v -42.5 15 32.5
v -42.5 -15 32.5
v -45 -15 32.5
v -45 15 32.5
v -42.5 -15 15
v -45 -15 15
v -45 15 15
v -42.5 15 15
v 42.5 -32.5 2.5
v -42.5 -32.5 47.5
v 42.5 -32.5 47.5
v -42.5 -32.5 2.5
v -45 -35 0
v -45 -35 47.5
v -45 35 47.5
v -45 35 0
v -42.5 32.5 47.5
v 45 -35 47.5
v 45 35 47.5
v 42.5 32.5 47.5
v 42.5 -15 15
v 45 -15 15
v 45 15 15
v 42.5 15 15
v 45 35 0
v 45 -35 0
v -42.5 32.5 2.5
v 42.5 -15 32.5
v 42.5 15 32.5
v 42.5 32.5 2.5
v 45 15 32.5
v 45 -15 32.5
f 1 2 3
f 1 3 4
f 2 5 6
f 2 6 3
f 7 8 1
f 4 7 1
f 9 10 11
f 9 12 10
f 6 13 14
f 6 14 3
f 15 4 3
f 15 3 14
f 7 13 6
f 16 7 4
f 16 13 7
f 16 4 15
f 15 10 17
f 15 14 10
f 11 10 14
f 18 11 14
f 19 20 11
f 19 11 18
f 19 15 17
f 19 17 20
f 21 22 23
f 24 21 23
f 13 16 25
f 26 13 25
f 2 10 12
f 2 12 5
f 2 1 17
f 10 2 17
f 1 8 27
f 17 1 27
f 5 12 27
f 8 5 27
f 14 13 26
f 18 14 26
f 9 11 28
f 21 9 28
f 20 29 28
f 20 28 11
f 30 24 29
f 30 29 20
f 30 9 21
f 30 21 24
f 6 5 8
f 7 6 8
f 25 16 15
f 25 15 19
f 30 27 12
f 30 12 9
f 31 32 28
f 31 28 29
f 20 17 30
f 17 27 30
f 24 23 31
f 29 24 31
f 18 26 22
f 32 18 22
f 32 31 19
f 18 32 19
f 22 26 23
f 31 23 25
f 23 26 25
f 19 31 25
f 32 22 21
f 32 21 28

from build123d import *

# Parameters (mm, degrees)
F0_W     = 90
F0_H     = 70
F1_DEPTH = 47.5
F2_T     = -2.5
F3_W     = 30
F3_H     = 17.5
F4_DEPTH = 90


with BuildPart() as f1:
    # F0 (on Top) → F1 (new body)
    with BuildSketch(Plane.XY):
        Rectangle(F0_W, F0_H)
    extrude(amount=F1_DEPTH)

    # F2
    f2_openings = [f1.faces().sort_by_distance(p)[0] for p in [
        (0, 0, 47.5),
    ]]
    offset(amount=F2_T, openings=f2_openings)

    # F3 (on face) → F4 (cut, through all)
    with BuildSketch(Plane.YZ.offset(45)):
        with Locations((0, 23.75)):
            Rectangle(F3_W, F3_H)
    extrude(amount=-F4_DEPTH, mode=Mode.SUBTRACT)


solid = f1.part
